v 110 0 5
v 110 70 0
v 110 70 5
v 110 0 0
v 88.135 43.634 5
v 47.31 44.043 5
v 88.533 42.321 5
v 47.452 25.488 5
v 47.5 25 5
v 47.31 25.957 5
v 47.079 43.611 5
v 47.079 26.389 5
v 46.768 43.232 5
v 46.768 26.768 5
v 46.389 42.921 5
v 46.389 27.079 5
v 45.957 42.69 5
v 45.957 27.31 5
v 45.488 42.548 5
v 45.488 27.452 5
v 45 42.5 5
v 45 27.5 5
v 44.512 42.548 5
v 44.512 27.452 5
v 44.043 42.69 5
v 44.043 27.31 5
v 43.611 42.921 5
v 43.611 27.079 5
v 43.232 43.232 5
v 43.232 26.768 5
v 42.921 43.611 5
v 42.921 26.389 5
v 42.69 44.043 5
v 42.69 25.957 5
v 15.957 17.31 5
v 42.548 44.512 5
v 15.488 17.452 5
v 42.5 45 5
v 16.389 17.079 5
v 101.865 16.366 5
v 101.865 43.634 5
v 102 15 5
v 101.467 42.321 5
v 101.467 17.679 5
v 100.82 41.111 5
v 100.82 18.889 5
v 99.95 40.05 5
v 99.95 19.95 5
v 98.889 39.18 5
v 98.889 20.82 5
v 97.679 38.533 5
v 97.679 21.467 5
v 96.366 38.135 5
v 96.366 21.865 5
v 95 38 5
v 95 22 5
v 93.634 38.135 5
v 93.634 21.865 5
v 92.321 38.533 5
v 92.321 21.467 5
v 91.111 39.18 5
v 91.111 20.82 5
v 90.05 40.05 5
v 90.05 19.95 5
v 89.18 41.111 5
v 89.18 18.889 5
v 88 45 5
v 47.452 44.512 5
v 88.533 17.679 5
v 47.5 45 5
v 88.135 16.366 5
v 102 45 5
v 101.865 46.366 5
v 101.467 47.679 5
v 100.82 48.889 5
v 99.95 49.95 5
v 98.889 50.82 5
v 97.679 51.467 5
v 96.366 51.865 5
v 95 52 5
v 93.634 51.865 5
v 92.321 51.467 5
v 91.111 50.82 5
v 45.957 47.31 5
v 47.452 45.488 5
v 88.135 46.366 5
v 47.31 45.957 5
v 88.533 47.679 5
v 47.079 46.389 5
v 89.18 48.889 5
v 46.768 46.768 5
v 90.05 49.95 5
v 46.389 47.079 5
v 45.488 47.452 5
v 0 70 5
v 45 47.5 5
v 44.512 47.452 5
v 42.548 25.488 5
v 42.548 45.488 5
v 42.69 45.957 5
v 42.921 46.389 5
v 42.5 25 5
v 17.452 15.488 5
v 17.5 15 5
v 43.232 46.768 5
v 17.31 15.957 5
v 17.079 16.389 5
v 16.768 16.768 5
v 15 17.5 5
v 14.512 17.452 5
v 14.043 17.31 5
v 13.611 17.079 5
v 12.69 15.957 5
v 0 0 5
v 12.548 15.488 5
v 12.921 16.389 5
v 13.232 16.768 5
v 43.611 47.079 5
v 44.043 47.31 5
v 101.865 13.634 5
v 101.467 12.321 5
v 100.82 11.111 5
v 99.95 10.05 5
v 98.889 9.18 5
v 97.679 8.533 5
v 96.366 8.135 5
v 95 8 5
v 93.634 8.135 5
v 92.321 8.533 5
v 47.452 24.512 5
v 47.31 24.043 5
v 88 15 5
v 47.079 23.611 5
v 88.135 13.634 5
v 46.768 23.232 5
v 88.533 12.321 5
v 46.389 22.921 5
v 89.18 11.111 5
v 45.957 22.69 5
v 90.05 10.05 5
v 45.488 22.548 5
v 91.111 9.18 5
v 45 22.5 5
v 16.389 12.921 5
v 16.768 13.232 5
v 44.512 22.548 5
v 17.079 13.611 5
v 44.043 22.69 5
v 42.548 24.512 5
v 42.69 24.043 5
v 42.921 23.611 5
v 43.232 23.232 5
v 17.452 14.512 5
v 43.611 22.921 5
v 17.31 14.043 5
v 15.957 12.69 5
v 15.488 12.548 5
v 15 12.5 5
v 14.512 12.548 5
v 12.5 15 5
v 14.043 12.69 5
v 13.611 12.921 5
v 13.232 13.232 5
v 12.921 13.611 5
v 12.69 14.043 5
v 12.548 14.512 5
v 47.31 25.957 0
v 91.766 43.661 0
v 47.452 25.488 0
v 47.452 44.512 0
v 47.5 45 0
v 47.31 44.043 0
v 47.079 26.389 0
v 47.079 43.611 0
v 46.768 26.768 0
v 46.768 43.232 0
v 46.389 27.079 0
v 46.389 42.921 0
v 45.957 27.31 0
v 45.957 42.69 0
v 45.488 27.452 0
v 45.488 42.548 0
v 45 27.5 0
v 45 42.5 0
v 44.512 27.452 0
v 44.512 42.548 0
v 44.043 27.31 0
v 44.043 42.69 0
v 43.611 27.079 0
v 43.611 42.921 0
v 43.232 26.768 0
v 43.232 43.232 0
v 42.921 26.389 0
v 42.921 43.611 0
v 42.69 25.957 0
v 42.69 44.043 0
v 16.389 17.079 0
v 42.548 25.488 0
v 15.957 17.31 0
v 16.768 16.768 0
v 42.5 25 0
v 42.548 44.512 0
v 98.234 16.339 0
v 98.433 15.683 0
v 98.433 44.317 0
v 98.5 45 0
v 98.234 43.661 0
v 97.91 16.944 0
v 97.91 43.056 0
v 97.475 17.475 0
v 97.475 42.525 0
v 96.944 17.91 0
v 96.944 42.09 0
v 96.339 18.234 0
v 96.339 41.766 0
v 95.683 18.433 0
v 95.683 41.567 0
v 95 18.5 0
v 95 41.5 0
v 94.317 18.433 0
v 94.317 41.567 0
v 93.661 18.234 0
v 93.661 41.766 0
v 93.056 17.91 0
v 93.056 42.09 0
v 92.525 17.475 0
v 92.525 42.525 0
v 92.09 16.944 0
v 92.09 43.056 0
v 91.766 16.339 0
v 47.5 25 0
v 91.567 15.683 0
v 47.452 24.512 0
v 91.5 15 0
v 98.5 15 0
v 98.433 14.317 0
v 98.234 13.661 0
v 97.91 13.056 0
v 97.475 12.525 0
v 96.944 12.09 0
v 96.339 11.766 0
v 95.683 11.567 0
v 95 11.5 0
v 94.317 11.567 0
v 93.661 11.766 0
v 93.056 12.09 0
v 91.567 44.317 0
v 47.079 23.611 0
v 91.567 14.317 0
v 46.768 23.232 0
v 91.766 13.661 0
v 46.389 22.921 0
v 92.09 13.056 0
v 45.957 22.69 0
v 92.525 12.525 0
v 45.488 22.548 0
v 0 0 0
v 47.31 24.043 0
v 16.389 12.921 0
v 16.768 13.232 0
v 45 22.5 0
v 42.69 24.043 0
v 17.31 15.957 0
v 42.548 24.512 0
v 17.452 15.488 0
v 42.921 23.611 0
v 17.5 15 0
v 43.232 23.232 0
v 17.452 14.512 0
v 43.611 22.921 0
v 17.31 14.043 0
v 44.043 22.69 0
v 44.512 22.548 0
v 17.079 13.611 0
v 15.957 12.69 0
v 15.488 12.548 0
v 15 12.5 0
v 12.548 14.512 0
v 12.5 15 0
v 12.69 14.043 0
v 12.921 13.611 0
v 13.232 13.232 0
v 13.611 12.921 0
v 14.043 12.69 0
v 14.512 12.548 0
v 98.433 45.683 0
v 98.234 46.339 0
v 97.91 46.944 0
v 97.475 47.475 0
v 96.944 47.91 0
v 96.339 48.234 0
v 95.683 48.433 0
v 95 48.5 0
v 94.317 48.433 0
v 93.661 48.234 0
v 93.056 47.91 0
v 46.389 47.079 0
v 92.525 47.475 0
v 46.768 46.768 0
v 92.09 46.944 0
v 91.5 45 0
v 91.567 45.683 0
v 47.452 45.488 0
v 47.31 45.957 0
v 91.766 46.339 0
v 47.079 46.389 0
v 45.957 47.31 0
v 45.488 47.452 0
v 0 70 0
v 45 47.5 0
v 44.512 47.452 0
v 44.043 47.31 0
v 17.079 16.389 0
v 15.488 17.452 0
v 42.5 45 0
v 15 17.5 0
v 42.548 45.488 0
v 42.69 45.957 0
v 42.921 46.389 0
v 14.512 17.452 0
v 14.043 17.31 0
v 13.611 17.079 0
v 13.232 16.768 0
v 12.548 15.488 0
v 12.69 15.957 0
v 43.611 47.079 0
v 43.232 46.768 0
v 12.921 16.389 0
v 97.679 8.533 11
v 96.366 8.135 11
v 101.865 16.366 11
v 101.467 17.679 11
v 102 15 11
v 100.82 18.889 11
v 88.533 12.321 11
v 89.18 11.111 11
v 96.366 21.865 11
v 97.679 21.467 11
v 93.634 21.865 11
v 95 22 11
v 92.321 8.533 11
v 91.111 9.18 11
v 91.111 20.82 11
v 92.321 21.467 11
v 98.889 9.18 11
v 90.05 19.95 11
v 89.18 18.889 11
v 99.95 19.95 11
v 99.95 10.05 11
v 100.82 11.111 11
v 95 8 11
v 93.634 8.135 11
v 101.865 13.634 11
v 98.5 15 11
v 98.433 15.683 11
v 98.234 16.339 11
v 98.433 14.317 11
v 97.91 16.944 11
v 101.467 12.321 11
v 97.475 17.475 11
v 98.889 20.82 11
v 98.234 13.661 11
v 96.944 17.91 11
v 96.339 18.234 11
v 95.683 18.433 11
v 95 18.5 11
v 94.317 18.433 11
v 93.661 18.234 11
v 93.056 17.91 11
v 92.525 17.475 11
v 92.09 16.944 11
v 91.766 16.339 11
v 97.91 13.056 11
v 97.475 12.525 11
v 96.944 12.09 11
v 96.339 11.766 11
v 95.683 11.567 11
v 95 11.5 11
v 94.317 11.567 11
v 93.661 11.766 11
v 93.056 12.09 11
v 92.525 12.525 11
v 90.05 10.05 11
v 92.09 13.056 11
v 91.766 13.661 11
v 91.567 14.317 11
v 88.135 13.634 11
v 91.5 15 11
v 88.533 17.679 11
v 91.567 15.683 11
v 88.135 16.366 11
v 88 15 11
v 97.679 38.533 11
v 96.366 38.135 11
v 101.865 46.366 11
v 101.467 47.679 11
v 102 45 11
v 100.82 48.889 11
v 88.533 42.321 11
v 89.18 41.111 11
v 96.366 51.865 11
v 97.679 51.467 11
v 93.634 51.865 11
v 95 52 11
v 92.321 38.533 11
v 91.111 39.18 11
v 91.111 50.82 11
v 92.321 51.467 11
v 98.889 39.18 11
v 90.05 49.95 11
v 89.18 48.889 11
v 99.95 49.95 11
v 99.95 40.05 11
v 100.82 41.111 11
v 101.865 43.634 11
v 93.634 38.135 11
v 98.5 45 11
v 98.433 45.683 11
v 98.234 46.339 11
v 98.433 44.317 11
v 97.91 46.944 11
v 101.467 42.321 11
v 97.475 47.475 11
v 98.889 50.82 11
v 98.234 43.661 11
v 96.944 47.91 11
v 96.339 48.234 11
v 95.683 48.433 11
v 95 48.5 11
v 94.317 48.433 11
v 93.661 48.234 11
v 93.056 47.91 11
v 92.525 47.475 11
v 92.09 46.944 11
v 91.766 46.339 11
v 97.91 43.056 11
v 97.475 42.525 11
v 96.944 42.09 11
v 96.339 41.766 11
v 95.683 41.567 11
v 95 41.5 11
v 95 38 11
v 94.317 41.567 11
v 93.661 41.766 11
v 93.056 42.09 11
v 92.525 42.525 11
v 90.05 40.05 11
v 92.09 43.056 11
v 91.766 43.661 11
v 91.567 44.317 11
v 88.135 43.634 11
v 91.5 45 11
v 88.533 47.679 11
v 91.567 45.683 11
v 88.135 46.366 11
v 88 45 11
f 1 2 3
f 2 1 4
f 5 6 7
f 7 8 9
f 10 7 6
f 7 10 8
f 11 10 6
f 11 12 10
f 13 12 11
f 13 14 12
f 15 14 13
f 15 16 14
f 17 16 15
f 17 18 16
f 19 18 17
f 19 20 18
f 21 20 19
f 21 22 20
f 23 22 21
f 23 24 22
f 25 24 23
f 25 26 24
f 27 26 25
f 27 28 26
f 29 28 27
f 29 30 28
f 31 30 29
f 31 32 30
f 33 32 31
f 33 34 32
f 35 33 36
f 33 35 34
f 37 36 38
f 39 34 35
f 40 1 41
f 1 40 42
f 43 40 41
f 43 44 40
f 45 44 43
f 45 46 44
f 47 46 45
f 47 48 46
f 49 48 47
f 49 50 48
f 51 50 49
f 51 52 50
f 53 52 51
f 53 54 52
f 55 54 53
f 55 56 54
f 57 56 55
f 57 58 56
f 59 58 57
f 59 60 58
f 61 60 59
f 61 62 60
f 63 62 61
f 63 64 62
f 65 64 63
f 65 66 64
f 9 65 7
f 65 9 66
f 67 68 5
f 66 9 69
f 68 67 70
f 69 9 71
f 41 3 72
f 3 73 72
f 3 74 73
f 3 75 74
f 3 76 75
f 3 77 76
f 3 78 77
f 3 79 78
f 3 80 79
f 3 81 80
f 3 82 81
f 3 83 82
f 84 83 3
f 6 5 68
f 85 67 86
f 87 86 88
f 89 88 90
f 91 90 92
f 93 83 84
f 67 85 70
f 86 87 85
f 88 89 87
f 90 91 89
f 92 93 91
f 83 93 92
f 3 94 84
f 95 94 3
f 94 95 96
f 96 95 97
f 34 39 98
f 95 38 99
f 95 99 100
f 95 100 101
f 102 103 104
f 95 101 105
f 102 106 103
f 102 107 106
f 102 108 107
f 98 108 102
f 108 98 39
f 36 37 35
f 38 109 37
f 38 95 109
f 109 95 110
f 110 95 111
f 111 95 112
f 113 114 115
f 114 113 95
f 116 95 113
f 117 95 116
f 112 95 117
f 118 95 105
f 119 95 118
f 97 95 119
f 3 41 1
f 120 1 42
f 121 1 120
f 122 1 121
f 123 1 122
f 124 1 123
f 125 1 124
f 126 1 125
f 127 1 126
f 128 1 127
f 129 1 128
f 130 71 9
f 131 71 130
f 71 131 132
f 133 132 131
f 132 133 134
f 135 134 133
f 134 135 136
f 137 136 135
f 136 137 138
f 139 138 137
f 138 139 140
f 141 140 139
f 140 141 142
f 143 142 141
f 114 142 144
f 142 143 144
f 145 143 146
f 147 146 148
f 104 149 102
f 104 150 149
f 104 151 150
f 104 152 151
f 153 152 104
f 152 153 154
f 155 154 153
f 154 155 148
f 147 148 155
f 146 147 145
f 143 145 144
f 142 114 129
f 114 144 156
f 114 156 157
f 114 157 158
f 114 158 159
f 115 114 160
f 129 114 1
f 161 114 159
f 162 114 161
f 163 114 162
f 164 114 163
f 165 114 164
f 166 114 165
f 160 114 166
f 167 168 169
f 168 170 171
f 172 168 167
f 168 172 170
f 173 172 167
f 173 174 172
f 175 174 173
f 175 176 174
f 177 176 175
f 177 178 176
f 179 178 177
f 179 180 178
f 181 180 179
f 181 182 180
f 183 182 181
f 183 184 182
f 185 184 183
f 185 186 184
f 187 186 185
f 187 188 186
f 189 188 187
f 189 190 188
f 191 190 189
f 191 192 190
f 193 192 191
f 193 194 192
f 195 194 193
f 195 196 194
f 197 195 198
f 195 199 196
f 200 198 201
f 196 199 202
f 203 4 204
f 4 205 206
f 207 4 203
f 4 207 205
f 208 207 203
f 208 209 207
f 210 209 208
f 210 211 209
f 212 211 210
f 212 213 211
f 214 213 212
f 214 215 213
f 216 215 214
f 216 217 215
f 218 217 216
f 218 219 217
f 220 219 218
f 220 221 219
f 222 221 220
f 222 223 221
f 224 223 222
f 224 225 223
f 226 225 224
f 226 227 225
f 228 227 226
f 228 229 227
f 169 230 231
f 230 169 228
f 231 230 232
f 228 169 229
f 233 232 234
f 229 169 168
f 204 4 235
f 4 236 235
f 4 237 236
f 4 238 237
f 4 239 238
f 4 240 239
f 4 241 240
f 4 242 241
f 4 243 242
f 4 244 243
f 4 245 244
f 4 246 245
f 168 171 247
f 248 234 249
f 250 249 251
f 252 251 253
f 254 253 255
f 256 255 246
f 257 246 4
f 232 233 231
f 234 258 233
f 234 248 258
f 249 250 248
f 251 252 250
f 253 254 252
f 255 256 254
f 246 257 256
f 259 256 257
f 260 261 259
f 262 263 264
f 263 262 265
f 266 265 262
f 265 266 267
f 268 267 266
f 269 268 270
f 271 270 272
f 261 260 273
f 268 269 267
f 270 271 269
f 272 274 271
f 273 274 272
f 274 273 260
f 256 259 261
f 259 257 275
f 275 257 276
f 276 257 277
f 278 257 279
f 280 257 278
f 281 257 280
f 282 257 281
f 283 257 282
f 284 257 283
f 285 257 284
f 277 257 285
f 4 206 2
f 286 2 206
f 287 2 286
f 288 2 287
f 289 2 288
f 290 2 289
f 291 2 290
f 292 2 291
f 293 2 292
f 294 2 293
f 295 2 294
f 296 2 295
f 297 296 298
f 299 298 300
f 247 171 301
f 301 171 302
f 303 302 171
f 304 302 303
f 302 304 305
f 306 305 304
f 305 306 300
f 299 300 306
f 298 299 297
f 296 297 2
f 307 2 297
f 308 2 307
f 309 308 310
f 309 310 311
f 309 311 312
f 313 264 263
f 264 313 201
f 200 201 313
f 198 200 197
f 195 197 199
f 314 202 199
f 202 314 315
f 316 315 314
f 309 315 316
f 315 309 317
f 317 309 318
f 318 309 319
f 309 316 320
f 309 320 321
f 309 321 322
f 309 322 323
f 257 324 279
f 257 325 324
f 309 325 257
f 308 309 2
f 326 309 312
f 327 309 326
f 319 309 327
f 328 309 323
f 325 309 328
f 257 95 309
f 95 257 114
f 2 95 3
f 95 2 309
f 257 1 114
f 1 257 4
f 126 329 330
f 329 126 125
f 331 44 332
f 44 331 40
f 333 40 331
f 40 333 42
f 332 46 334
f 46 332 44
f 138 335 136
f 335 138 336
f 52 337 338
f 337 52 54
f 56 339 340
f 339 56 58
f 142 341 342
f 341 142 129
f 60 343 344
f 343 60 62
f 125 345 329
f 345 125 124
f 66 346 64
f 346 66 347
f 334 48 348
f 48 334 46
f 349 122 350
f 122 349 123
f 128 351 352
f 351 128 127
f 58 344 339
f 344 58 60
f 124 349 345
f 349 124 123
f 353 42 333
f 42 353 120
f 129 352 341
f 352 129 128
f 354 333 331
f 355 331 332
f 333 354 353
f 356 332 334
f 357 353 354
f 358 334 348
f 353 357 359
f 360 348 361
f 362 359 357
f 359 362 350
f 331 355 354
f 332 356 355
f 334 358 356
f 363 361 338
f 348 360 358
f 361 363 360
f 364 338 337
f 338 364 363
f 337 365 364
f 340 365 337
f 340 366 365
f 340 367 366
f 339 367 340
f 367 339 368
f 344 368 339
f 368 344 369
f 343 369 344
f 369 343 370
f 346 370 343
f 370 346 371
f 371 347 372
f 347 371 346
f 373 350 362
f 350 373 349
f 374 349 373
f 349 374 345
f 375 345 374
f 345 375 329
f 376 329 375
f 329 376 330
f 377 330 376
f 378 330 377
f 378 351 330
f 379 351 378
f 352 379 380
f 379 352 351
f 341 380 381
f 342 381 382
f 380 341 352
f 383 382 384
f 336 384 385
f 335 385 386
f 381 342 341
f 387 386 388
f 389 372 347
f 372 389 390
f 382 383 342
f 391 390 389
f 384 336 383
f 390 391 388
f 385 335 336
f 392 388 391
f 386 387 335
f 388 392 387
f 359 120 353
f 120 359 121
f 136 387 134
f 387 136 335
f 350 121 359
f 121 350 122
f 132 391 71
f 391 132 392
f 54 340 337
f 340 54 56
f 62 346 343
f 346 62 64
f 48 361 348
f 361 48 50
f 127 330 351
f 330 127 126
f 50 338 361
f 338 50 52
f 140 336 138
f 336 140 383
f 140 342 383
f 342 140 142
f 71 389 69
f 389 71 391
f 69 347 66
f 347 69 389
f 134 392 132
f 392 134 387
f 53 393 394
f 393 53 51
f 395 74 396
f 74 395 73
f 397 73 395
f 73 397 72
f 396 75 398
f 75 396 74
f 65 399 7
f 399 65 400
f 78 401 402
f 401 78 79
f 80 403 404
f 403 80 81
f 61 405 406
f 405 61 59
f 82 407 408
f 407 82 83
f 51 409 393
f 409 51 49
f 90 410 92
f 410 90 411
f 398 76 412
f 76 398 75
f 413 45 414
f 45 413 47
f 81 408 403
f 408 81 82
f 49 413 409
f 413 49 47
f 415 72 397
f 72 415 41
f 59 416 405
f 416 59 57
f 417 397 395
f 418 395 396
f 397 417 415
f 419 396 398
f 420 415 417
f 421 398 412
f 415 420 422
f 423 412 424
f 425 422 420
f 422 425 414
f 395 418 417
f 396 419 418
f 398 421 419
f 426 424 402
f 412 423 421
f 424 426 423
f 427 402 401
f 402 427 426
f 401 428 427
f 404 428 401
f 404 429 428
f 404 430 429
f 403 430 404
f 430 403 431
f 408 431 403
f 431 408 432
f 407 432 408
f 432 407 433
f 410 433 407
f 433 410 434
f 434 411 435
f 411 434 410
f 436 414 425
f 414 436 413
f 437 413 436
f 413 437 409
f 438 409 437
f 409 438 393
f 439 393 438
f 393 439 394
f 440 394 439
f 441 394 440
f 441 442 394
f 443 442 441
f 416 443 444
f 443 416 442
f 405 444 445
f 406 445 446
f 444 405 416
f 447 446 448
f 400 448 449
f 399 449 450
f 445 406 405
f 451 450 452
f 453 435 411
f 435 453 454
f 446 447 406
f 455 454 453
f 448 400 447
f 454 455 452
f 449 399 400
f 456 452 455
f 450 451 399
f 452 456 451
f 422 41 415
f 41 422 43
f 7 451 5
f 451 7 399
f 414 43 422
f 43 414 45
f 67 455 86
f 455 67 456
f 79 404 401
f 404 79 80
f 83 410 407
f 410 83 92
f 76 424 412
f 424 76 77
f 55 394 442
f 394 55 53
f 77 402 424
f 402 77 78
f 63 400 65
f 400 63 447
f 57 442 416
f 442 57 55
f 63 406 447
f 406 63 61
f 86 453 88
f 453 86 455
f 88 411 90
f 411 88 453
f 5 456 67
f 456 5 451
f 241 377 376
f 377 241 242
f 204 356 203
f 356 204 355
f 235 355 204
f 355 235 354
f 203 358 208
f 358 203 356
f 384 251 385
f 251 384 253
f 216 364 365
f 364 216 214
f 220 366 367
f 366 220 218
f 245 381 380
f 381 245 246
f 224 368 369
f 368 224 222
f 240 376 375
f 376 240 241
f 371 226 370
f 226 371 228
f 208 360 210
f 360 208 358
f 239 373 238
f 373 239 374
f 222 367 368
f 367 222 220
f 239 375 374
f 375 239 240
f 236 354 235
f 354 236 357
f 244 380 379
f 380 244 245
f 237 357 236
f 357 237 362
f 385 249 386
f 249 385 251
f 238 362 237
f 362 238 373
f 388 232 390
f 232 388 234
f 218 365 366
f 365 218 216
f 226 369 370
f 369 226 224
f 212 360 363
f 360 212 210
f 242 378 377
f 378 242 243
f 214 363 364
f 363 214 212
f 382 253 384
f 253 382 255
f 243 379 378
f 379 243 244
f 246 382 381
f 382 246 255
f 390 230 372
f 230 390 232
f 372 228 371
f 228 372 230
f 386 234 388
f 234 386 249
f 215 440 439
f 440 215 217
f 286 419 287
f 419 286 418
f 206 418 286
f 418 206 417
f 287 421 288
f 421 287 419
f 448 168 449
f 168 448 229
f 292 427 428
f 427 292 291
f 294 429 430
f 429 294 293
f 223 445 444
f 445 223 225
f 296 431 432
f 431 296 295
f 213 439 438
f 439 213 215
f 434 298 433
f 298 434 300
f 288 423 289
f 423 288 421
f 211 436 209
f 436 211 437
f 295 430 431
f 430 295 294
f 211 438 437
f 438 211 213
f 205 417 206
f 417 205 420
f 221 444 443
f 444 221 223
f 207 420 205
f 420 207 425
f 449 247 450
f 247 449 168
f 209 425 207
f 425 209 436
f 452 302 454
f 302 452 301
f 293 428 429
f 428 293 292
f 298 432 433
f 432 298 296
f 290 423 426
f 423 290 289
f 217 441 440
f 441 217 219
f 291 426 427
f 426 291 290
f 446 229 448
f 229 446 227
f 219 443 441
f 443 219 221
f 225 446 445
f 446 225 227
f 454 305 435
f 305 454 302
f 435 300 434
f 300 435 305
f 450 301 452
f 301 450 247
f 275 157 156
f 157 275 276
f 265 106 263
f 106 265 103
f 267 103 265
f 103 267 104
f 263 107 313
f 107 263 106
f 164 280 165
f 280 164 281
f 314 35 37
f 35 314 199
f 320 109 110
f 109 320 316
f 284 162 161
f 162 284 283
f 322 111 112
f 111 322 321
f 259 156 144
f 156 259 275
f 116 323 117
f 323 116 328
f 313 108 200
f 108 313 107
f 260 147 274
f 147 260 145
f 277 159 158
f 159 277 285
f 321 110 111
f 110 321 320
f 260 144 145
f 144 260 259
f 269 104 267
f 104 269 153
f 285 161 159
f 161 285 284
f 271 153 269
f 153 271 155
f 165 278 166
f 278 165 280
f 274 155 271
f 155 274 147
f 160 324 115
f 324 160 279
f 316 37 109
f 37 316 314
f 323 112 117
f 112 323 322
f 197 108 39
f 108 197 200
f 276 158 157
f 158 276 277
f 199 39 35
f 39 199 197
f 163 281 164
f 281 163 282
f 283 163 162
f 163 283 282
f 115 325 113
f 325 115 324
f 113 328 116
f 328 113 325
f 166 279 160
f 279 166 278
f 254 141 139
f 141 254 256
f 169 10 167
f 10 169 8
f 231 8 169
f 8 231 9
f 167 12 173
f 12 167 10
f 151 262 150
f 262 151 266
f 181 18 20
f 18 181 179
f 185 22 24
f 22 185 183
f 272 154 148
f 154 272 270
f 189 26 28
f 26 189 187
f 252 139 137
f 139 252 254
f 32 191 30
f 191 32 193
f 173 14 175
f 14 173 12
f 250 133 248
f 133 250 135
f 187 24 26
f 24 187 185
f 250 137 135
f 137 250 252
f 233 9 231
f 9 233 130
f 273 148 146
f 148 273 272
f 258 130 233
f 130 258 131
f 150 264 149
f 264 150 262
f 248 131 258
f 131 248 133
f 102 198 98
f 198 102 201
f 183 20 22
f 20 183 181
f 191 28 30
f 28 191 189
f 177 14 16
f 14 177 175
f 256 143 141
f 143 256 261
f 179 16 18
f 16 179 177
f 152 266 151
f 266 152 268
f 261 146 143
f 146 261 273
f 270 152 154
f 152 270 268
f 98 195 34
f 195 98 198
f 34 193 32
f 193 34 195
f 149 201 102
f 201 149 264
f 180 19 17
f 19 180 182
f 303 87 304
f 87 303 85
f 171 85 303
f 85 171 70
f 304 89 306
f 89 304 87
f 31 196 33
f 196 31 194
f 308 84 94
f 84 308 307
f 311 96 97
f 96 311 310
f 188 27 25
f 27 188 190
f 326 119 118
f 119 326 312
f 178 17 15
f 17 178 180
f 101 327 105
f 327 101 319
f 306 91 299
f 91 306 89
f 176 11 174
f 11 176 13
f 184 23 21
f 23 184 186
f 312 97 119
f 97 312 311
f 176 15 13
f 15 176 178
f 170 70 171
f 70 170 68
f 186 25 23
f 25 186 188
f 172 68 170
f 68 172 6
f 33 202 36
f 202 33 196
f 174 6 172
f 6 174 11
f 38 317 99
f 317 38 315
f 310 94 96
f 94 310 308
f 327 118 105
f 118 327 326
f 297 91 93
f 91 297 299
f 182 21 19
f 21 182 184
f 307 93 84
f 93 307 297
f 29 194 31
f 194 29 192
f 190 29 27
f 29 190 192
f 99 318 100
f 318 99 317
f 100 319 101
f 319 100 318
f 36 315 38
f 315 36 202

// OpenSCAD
$fn = 32;

// ----------------------------------------------------------------------
// Mixed field: bosses and holes at given coordinates
// ----------------------------------------------------------------------

// --- parameters (mm) ---
plate_l = 110;            // plate length, X
plate_w = 70;             // plate width, Y
plate_t = 5;              // plate thickness, Z
boss_d = 14;              // boss diameter
boss_h = 6;               // boss height above the plate
hole_d = 5;               // through hole diameter

total_h = plate_t + boss_h;  // overall height

difference() {
  union() {
    cube([plate_l, plate_w, plate_t]);
    translate([95, 15, plate_t]) cylinder(h = boss_h, d = boss_d);
    translate([95, 45, plate_t]) cylinder(h = boss_h, d = boss_d);
  }
  translate([95, 15, -1]) cylinder(h = total_h + 2, d = boss_d / 2);
  translate([95, 45, -1]) cylinder(h = total_h + 2, d = boss_d / 2);
  translate([15, 15, -1]) cylinder(h = plate_t + 2, d = hole_d);
  translate([45, 25, -1]) cylinder(h = plate_t + 2, d = hole_d);
  translate([45, 45, -1]) cylinder(h = plate_t + 2, d = hole_d);
}
